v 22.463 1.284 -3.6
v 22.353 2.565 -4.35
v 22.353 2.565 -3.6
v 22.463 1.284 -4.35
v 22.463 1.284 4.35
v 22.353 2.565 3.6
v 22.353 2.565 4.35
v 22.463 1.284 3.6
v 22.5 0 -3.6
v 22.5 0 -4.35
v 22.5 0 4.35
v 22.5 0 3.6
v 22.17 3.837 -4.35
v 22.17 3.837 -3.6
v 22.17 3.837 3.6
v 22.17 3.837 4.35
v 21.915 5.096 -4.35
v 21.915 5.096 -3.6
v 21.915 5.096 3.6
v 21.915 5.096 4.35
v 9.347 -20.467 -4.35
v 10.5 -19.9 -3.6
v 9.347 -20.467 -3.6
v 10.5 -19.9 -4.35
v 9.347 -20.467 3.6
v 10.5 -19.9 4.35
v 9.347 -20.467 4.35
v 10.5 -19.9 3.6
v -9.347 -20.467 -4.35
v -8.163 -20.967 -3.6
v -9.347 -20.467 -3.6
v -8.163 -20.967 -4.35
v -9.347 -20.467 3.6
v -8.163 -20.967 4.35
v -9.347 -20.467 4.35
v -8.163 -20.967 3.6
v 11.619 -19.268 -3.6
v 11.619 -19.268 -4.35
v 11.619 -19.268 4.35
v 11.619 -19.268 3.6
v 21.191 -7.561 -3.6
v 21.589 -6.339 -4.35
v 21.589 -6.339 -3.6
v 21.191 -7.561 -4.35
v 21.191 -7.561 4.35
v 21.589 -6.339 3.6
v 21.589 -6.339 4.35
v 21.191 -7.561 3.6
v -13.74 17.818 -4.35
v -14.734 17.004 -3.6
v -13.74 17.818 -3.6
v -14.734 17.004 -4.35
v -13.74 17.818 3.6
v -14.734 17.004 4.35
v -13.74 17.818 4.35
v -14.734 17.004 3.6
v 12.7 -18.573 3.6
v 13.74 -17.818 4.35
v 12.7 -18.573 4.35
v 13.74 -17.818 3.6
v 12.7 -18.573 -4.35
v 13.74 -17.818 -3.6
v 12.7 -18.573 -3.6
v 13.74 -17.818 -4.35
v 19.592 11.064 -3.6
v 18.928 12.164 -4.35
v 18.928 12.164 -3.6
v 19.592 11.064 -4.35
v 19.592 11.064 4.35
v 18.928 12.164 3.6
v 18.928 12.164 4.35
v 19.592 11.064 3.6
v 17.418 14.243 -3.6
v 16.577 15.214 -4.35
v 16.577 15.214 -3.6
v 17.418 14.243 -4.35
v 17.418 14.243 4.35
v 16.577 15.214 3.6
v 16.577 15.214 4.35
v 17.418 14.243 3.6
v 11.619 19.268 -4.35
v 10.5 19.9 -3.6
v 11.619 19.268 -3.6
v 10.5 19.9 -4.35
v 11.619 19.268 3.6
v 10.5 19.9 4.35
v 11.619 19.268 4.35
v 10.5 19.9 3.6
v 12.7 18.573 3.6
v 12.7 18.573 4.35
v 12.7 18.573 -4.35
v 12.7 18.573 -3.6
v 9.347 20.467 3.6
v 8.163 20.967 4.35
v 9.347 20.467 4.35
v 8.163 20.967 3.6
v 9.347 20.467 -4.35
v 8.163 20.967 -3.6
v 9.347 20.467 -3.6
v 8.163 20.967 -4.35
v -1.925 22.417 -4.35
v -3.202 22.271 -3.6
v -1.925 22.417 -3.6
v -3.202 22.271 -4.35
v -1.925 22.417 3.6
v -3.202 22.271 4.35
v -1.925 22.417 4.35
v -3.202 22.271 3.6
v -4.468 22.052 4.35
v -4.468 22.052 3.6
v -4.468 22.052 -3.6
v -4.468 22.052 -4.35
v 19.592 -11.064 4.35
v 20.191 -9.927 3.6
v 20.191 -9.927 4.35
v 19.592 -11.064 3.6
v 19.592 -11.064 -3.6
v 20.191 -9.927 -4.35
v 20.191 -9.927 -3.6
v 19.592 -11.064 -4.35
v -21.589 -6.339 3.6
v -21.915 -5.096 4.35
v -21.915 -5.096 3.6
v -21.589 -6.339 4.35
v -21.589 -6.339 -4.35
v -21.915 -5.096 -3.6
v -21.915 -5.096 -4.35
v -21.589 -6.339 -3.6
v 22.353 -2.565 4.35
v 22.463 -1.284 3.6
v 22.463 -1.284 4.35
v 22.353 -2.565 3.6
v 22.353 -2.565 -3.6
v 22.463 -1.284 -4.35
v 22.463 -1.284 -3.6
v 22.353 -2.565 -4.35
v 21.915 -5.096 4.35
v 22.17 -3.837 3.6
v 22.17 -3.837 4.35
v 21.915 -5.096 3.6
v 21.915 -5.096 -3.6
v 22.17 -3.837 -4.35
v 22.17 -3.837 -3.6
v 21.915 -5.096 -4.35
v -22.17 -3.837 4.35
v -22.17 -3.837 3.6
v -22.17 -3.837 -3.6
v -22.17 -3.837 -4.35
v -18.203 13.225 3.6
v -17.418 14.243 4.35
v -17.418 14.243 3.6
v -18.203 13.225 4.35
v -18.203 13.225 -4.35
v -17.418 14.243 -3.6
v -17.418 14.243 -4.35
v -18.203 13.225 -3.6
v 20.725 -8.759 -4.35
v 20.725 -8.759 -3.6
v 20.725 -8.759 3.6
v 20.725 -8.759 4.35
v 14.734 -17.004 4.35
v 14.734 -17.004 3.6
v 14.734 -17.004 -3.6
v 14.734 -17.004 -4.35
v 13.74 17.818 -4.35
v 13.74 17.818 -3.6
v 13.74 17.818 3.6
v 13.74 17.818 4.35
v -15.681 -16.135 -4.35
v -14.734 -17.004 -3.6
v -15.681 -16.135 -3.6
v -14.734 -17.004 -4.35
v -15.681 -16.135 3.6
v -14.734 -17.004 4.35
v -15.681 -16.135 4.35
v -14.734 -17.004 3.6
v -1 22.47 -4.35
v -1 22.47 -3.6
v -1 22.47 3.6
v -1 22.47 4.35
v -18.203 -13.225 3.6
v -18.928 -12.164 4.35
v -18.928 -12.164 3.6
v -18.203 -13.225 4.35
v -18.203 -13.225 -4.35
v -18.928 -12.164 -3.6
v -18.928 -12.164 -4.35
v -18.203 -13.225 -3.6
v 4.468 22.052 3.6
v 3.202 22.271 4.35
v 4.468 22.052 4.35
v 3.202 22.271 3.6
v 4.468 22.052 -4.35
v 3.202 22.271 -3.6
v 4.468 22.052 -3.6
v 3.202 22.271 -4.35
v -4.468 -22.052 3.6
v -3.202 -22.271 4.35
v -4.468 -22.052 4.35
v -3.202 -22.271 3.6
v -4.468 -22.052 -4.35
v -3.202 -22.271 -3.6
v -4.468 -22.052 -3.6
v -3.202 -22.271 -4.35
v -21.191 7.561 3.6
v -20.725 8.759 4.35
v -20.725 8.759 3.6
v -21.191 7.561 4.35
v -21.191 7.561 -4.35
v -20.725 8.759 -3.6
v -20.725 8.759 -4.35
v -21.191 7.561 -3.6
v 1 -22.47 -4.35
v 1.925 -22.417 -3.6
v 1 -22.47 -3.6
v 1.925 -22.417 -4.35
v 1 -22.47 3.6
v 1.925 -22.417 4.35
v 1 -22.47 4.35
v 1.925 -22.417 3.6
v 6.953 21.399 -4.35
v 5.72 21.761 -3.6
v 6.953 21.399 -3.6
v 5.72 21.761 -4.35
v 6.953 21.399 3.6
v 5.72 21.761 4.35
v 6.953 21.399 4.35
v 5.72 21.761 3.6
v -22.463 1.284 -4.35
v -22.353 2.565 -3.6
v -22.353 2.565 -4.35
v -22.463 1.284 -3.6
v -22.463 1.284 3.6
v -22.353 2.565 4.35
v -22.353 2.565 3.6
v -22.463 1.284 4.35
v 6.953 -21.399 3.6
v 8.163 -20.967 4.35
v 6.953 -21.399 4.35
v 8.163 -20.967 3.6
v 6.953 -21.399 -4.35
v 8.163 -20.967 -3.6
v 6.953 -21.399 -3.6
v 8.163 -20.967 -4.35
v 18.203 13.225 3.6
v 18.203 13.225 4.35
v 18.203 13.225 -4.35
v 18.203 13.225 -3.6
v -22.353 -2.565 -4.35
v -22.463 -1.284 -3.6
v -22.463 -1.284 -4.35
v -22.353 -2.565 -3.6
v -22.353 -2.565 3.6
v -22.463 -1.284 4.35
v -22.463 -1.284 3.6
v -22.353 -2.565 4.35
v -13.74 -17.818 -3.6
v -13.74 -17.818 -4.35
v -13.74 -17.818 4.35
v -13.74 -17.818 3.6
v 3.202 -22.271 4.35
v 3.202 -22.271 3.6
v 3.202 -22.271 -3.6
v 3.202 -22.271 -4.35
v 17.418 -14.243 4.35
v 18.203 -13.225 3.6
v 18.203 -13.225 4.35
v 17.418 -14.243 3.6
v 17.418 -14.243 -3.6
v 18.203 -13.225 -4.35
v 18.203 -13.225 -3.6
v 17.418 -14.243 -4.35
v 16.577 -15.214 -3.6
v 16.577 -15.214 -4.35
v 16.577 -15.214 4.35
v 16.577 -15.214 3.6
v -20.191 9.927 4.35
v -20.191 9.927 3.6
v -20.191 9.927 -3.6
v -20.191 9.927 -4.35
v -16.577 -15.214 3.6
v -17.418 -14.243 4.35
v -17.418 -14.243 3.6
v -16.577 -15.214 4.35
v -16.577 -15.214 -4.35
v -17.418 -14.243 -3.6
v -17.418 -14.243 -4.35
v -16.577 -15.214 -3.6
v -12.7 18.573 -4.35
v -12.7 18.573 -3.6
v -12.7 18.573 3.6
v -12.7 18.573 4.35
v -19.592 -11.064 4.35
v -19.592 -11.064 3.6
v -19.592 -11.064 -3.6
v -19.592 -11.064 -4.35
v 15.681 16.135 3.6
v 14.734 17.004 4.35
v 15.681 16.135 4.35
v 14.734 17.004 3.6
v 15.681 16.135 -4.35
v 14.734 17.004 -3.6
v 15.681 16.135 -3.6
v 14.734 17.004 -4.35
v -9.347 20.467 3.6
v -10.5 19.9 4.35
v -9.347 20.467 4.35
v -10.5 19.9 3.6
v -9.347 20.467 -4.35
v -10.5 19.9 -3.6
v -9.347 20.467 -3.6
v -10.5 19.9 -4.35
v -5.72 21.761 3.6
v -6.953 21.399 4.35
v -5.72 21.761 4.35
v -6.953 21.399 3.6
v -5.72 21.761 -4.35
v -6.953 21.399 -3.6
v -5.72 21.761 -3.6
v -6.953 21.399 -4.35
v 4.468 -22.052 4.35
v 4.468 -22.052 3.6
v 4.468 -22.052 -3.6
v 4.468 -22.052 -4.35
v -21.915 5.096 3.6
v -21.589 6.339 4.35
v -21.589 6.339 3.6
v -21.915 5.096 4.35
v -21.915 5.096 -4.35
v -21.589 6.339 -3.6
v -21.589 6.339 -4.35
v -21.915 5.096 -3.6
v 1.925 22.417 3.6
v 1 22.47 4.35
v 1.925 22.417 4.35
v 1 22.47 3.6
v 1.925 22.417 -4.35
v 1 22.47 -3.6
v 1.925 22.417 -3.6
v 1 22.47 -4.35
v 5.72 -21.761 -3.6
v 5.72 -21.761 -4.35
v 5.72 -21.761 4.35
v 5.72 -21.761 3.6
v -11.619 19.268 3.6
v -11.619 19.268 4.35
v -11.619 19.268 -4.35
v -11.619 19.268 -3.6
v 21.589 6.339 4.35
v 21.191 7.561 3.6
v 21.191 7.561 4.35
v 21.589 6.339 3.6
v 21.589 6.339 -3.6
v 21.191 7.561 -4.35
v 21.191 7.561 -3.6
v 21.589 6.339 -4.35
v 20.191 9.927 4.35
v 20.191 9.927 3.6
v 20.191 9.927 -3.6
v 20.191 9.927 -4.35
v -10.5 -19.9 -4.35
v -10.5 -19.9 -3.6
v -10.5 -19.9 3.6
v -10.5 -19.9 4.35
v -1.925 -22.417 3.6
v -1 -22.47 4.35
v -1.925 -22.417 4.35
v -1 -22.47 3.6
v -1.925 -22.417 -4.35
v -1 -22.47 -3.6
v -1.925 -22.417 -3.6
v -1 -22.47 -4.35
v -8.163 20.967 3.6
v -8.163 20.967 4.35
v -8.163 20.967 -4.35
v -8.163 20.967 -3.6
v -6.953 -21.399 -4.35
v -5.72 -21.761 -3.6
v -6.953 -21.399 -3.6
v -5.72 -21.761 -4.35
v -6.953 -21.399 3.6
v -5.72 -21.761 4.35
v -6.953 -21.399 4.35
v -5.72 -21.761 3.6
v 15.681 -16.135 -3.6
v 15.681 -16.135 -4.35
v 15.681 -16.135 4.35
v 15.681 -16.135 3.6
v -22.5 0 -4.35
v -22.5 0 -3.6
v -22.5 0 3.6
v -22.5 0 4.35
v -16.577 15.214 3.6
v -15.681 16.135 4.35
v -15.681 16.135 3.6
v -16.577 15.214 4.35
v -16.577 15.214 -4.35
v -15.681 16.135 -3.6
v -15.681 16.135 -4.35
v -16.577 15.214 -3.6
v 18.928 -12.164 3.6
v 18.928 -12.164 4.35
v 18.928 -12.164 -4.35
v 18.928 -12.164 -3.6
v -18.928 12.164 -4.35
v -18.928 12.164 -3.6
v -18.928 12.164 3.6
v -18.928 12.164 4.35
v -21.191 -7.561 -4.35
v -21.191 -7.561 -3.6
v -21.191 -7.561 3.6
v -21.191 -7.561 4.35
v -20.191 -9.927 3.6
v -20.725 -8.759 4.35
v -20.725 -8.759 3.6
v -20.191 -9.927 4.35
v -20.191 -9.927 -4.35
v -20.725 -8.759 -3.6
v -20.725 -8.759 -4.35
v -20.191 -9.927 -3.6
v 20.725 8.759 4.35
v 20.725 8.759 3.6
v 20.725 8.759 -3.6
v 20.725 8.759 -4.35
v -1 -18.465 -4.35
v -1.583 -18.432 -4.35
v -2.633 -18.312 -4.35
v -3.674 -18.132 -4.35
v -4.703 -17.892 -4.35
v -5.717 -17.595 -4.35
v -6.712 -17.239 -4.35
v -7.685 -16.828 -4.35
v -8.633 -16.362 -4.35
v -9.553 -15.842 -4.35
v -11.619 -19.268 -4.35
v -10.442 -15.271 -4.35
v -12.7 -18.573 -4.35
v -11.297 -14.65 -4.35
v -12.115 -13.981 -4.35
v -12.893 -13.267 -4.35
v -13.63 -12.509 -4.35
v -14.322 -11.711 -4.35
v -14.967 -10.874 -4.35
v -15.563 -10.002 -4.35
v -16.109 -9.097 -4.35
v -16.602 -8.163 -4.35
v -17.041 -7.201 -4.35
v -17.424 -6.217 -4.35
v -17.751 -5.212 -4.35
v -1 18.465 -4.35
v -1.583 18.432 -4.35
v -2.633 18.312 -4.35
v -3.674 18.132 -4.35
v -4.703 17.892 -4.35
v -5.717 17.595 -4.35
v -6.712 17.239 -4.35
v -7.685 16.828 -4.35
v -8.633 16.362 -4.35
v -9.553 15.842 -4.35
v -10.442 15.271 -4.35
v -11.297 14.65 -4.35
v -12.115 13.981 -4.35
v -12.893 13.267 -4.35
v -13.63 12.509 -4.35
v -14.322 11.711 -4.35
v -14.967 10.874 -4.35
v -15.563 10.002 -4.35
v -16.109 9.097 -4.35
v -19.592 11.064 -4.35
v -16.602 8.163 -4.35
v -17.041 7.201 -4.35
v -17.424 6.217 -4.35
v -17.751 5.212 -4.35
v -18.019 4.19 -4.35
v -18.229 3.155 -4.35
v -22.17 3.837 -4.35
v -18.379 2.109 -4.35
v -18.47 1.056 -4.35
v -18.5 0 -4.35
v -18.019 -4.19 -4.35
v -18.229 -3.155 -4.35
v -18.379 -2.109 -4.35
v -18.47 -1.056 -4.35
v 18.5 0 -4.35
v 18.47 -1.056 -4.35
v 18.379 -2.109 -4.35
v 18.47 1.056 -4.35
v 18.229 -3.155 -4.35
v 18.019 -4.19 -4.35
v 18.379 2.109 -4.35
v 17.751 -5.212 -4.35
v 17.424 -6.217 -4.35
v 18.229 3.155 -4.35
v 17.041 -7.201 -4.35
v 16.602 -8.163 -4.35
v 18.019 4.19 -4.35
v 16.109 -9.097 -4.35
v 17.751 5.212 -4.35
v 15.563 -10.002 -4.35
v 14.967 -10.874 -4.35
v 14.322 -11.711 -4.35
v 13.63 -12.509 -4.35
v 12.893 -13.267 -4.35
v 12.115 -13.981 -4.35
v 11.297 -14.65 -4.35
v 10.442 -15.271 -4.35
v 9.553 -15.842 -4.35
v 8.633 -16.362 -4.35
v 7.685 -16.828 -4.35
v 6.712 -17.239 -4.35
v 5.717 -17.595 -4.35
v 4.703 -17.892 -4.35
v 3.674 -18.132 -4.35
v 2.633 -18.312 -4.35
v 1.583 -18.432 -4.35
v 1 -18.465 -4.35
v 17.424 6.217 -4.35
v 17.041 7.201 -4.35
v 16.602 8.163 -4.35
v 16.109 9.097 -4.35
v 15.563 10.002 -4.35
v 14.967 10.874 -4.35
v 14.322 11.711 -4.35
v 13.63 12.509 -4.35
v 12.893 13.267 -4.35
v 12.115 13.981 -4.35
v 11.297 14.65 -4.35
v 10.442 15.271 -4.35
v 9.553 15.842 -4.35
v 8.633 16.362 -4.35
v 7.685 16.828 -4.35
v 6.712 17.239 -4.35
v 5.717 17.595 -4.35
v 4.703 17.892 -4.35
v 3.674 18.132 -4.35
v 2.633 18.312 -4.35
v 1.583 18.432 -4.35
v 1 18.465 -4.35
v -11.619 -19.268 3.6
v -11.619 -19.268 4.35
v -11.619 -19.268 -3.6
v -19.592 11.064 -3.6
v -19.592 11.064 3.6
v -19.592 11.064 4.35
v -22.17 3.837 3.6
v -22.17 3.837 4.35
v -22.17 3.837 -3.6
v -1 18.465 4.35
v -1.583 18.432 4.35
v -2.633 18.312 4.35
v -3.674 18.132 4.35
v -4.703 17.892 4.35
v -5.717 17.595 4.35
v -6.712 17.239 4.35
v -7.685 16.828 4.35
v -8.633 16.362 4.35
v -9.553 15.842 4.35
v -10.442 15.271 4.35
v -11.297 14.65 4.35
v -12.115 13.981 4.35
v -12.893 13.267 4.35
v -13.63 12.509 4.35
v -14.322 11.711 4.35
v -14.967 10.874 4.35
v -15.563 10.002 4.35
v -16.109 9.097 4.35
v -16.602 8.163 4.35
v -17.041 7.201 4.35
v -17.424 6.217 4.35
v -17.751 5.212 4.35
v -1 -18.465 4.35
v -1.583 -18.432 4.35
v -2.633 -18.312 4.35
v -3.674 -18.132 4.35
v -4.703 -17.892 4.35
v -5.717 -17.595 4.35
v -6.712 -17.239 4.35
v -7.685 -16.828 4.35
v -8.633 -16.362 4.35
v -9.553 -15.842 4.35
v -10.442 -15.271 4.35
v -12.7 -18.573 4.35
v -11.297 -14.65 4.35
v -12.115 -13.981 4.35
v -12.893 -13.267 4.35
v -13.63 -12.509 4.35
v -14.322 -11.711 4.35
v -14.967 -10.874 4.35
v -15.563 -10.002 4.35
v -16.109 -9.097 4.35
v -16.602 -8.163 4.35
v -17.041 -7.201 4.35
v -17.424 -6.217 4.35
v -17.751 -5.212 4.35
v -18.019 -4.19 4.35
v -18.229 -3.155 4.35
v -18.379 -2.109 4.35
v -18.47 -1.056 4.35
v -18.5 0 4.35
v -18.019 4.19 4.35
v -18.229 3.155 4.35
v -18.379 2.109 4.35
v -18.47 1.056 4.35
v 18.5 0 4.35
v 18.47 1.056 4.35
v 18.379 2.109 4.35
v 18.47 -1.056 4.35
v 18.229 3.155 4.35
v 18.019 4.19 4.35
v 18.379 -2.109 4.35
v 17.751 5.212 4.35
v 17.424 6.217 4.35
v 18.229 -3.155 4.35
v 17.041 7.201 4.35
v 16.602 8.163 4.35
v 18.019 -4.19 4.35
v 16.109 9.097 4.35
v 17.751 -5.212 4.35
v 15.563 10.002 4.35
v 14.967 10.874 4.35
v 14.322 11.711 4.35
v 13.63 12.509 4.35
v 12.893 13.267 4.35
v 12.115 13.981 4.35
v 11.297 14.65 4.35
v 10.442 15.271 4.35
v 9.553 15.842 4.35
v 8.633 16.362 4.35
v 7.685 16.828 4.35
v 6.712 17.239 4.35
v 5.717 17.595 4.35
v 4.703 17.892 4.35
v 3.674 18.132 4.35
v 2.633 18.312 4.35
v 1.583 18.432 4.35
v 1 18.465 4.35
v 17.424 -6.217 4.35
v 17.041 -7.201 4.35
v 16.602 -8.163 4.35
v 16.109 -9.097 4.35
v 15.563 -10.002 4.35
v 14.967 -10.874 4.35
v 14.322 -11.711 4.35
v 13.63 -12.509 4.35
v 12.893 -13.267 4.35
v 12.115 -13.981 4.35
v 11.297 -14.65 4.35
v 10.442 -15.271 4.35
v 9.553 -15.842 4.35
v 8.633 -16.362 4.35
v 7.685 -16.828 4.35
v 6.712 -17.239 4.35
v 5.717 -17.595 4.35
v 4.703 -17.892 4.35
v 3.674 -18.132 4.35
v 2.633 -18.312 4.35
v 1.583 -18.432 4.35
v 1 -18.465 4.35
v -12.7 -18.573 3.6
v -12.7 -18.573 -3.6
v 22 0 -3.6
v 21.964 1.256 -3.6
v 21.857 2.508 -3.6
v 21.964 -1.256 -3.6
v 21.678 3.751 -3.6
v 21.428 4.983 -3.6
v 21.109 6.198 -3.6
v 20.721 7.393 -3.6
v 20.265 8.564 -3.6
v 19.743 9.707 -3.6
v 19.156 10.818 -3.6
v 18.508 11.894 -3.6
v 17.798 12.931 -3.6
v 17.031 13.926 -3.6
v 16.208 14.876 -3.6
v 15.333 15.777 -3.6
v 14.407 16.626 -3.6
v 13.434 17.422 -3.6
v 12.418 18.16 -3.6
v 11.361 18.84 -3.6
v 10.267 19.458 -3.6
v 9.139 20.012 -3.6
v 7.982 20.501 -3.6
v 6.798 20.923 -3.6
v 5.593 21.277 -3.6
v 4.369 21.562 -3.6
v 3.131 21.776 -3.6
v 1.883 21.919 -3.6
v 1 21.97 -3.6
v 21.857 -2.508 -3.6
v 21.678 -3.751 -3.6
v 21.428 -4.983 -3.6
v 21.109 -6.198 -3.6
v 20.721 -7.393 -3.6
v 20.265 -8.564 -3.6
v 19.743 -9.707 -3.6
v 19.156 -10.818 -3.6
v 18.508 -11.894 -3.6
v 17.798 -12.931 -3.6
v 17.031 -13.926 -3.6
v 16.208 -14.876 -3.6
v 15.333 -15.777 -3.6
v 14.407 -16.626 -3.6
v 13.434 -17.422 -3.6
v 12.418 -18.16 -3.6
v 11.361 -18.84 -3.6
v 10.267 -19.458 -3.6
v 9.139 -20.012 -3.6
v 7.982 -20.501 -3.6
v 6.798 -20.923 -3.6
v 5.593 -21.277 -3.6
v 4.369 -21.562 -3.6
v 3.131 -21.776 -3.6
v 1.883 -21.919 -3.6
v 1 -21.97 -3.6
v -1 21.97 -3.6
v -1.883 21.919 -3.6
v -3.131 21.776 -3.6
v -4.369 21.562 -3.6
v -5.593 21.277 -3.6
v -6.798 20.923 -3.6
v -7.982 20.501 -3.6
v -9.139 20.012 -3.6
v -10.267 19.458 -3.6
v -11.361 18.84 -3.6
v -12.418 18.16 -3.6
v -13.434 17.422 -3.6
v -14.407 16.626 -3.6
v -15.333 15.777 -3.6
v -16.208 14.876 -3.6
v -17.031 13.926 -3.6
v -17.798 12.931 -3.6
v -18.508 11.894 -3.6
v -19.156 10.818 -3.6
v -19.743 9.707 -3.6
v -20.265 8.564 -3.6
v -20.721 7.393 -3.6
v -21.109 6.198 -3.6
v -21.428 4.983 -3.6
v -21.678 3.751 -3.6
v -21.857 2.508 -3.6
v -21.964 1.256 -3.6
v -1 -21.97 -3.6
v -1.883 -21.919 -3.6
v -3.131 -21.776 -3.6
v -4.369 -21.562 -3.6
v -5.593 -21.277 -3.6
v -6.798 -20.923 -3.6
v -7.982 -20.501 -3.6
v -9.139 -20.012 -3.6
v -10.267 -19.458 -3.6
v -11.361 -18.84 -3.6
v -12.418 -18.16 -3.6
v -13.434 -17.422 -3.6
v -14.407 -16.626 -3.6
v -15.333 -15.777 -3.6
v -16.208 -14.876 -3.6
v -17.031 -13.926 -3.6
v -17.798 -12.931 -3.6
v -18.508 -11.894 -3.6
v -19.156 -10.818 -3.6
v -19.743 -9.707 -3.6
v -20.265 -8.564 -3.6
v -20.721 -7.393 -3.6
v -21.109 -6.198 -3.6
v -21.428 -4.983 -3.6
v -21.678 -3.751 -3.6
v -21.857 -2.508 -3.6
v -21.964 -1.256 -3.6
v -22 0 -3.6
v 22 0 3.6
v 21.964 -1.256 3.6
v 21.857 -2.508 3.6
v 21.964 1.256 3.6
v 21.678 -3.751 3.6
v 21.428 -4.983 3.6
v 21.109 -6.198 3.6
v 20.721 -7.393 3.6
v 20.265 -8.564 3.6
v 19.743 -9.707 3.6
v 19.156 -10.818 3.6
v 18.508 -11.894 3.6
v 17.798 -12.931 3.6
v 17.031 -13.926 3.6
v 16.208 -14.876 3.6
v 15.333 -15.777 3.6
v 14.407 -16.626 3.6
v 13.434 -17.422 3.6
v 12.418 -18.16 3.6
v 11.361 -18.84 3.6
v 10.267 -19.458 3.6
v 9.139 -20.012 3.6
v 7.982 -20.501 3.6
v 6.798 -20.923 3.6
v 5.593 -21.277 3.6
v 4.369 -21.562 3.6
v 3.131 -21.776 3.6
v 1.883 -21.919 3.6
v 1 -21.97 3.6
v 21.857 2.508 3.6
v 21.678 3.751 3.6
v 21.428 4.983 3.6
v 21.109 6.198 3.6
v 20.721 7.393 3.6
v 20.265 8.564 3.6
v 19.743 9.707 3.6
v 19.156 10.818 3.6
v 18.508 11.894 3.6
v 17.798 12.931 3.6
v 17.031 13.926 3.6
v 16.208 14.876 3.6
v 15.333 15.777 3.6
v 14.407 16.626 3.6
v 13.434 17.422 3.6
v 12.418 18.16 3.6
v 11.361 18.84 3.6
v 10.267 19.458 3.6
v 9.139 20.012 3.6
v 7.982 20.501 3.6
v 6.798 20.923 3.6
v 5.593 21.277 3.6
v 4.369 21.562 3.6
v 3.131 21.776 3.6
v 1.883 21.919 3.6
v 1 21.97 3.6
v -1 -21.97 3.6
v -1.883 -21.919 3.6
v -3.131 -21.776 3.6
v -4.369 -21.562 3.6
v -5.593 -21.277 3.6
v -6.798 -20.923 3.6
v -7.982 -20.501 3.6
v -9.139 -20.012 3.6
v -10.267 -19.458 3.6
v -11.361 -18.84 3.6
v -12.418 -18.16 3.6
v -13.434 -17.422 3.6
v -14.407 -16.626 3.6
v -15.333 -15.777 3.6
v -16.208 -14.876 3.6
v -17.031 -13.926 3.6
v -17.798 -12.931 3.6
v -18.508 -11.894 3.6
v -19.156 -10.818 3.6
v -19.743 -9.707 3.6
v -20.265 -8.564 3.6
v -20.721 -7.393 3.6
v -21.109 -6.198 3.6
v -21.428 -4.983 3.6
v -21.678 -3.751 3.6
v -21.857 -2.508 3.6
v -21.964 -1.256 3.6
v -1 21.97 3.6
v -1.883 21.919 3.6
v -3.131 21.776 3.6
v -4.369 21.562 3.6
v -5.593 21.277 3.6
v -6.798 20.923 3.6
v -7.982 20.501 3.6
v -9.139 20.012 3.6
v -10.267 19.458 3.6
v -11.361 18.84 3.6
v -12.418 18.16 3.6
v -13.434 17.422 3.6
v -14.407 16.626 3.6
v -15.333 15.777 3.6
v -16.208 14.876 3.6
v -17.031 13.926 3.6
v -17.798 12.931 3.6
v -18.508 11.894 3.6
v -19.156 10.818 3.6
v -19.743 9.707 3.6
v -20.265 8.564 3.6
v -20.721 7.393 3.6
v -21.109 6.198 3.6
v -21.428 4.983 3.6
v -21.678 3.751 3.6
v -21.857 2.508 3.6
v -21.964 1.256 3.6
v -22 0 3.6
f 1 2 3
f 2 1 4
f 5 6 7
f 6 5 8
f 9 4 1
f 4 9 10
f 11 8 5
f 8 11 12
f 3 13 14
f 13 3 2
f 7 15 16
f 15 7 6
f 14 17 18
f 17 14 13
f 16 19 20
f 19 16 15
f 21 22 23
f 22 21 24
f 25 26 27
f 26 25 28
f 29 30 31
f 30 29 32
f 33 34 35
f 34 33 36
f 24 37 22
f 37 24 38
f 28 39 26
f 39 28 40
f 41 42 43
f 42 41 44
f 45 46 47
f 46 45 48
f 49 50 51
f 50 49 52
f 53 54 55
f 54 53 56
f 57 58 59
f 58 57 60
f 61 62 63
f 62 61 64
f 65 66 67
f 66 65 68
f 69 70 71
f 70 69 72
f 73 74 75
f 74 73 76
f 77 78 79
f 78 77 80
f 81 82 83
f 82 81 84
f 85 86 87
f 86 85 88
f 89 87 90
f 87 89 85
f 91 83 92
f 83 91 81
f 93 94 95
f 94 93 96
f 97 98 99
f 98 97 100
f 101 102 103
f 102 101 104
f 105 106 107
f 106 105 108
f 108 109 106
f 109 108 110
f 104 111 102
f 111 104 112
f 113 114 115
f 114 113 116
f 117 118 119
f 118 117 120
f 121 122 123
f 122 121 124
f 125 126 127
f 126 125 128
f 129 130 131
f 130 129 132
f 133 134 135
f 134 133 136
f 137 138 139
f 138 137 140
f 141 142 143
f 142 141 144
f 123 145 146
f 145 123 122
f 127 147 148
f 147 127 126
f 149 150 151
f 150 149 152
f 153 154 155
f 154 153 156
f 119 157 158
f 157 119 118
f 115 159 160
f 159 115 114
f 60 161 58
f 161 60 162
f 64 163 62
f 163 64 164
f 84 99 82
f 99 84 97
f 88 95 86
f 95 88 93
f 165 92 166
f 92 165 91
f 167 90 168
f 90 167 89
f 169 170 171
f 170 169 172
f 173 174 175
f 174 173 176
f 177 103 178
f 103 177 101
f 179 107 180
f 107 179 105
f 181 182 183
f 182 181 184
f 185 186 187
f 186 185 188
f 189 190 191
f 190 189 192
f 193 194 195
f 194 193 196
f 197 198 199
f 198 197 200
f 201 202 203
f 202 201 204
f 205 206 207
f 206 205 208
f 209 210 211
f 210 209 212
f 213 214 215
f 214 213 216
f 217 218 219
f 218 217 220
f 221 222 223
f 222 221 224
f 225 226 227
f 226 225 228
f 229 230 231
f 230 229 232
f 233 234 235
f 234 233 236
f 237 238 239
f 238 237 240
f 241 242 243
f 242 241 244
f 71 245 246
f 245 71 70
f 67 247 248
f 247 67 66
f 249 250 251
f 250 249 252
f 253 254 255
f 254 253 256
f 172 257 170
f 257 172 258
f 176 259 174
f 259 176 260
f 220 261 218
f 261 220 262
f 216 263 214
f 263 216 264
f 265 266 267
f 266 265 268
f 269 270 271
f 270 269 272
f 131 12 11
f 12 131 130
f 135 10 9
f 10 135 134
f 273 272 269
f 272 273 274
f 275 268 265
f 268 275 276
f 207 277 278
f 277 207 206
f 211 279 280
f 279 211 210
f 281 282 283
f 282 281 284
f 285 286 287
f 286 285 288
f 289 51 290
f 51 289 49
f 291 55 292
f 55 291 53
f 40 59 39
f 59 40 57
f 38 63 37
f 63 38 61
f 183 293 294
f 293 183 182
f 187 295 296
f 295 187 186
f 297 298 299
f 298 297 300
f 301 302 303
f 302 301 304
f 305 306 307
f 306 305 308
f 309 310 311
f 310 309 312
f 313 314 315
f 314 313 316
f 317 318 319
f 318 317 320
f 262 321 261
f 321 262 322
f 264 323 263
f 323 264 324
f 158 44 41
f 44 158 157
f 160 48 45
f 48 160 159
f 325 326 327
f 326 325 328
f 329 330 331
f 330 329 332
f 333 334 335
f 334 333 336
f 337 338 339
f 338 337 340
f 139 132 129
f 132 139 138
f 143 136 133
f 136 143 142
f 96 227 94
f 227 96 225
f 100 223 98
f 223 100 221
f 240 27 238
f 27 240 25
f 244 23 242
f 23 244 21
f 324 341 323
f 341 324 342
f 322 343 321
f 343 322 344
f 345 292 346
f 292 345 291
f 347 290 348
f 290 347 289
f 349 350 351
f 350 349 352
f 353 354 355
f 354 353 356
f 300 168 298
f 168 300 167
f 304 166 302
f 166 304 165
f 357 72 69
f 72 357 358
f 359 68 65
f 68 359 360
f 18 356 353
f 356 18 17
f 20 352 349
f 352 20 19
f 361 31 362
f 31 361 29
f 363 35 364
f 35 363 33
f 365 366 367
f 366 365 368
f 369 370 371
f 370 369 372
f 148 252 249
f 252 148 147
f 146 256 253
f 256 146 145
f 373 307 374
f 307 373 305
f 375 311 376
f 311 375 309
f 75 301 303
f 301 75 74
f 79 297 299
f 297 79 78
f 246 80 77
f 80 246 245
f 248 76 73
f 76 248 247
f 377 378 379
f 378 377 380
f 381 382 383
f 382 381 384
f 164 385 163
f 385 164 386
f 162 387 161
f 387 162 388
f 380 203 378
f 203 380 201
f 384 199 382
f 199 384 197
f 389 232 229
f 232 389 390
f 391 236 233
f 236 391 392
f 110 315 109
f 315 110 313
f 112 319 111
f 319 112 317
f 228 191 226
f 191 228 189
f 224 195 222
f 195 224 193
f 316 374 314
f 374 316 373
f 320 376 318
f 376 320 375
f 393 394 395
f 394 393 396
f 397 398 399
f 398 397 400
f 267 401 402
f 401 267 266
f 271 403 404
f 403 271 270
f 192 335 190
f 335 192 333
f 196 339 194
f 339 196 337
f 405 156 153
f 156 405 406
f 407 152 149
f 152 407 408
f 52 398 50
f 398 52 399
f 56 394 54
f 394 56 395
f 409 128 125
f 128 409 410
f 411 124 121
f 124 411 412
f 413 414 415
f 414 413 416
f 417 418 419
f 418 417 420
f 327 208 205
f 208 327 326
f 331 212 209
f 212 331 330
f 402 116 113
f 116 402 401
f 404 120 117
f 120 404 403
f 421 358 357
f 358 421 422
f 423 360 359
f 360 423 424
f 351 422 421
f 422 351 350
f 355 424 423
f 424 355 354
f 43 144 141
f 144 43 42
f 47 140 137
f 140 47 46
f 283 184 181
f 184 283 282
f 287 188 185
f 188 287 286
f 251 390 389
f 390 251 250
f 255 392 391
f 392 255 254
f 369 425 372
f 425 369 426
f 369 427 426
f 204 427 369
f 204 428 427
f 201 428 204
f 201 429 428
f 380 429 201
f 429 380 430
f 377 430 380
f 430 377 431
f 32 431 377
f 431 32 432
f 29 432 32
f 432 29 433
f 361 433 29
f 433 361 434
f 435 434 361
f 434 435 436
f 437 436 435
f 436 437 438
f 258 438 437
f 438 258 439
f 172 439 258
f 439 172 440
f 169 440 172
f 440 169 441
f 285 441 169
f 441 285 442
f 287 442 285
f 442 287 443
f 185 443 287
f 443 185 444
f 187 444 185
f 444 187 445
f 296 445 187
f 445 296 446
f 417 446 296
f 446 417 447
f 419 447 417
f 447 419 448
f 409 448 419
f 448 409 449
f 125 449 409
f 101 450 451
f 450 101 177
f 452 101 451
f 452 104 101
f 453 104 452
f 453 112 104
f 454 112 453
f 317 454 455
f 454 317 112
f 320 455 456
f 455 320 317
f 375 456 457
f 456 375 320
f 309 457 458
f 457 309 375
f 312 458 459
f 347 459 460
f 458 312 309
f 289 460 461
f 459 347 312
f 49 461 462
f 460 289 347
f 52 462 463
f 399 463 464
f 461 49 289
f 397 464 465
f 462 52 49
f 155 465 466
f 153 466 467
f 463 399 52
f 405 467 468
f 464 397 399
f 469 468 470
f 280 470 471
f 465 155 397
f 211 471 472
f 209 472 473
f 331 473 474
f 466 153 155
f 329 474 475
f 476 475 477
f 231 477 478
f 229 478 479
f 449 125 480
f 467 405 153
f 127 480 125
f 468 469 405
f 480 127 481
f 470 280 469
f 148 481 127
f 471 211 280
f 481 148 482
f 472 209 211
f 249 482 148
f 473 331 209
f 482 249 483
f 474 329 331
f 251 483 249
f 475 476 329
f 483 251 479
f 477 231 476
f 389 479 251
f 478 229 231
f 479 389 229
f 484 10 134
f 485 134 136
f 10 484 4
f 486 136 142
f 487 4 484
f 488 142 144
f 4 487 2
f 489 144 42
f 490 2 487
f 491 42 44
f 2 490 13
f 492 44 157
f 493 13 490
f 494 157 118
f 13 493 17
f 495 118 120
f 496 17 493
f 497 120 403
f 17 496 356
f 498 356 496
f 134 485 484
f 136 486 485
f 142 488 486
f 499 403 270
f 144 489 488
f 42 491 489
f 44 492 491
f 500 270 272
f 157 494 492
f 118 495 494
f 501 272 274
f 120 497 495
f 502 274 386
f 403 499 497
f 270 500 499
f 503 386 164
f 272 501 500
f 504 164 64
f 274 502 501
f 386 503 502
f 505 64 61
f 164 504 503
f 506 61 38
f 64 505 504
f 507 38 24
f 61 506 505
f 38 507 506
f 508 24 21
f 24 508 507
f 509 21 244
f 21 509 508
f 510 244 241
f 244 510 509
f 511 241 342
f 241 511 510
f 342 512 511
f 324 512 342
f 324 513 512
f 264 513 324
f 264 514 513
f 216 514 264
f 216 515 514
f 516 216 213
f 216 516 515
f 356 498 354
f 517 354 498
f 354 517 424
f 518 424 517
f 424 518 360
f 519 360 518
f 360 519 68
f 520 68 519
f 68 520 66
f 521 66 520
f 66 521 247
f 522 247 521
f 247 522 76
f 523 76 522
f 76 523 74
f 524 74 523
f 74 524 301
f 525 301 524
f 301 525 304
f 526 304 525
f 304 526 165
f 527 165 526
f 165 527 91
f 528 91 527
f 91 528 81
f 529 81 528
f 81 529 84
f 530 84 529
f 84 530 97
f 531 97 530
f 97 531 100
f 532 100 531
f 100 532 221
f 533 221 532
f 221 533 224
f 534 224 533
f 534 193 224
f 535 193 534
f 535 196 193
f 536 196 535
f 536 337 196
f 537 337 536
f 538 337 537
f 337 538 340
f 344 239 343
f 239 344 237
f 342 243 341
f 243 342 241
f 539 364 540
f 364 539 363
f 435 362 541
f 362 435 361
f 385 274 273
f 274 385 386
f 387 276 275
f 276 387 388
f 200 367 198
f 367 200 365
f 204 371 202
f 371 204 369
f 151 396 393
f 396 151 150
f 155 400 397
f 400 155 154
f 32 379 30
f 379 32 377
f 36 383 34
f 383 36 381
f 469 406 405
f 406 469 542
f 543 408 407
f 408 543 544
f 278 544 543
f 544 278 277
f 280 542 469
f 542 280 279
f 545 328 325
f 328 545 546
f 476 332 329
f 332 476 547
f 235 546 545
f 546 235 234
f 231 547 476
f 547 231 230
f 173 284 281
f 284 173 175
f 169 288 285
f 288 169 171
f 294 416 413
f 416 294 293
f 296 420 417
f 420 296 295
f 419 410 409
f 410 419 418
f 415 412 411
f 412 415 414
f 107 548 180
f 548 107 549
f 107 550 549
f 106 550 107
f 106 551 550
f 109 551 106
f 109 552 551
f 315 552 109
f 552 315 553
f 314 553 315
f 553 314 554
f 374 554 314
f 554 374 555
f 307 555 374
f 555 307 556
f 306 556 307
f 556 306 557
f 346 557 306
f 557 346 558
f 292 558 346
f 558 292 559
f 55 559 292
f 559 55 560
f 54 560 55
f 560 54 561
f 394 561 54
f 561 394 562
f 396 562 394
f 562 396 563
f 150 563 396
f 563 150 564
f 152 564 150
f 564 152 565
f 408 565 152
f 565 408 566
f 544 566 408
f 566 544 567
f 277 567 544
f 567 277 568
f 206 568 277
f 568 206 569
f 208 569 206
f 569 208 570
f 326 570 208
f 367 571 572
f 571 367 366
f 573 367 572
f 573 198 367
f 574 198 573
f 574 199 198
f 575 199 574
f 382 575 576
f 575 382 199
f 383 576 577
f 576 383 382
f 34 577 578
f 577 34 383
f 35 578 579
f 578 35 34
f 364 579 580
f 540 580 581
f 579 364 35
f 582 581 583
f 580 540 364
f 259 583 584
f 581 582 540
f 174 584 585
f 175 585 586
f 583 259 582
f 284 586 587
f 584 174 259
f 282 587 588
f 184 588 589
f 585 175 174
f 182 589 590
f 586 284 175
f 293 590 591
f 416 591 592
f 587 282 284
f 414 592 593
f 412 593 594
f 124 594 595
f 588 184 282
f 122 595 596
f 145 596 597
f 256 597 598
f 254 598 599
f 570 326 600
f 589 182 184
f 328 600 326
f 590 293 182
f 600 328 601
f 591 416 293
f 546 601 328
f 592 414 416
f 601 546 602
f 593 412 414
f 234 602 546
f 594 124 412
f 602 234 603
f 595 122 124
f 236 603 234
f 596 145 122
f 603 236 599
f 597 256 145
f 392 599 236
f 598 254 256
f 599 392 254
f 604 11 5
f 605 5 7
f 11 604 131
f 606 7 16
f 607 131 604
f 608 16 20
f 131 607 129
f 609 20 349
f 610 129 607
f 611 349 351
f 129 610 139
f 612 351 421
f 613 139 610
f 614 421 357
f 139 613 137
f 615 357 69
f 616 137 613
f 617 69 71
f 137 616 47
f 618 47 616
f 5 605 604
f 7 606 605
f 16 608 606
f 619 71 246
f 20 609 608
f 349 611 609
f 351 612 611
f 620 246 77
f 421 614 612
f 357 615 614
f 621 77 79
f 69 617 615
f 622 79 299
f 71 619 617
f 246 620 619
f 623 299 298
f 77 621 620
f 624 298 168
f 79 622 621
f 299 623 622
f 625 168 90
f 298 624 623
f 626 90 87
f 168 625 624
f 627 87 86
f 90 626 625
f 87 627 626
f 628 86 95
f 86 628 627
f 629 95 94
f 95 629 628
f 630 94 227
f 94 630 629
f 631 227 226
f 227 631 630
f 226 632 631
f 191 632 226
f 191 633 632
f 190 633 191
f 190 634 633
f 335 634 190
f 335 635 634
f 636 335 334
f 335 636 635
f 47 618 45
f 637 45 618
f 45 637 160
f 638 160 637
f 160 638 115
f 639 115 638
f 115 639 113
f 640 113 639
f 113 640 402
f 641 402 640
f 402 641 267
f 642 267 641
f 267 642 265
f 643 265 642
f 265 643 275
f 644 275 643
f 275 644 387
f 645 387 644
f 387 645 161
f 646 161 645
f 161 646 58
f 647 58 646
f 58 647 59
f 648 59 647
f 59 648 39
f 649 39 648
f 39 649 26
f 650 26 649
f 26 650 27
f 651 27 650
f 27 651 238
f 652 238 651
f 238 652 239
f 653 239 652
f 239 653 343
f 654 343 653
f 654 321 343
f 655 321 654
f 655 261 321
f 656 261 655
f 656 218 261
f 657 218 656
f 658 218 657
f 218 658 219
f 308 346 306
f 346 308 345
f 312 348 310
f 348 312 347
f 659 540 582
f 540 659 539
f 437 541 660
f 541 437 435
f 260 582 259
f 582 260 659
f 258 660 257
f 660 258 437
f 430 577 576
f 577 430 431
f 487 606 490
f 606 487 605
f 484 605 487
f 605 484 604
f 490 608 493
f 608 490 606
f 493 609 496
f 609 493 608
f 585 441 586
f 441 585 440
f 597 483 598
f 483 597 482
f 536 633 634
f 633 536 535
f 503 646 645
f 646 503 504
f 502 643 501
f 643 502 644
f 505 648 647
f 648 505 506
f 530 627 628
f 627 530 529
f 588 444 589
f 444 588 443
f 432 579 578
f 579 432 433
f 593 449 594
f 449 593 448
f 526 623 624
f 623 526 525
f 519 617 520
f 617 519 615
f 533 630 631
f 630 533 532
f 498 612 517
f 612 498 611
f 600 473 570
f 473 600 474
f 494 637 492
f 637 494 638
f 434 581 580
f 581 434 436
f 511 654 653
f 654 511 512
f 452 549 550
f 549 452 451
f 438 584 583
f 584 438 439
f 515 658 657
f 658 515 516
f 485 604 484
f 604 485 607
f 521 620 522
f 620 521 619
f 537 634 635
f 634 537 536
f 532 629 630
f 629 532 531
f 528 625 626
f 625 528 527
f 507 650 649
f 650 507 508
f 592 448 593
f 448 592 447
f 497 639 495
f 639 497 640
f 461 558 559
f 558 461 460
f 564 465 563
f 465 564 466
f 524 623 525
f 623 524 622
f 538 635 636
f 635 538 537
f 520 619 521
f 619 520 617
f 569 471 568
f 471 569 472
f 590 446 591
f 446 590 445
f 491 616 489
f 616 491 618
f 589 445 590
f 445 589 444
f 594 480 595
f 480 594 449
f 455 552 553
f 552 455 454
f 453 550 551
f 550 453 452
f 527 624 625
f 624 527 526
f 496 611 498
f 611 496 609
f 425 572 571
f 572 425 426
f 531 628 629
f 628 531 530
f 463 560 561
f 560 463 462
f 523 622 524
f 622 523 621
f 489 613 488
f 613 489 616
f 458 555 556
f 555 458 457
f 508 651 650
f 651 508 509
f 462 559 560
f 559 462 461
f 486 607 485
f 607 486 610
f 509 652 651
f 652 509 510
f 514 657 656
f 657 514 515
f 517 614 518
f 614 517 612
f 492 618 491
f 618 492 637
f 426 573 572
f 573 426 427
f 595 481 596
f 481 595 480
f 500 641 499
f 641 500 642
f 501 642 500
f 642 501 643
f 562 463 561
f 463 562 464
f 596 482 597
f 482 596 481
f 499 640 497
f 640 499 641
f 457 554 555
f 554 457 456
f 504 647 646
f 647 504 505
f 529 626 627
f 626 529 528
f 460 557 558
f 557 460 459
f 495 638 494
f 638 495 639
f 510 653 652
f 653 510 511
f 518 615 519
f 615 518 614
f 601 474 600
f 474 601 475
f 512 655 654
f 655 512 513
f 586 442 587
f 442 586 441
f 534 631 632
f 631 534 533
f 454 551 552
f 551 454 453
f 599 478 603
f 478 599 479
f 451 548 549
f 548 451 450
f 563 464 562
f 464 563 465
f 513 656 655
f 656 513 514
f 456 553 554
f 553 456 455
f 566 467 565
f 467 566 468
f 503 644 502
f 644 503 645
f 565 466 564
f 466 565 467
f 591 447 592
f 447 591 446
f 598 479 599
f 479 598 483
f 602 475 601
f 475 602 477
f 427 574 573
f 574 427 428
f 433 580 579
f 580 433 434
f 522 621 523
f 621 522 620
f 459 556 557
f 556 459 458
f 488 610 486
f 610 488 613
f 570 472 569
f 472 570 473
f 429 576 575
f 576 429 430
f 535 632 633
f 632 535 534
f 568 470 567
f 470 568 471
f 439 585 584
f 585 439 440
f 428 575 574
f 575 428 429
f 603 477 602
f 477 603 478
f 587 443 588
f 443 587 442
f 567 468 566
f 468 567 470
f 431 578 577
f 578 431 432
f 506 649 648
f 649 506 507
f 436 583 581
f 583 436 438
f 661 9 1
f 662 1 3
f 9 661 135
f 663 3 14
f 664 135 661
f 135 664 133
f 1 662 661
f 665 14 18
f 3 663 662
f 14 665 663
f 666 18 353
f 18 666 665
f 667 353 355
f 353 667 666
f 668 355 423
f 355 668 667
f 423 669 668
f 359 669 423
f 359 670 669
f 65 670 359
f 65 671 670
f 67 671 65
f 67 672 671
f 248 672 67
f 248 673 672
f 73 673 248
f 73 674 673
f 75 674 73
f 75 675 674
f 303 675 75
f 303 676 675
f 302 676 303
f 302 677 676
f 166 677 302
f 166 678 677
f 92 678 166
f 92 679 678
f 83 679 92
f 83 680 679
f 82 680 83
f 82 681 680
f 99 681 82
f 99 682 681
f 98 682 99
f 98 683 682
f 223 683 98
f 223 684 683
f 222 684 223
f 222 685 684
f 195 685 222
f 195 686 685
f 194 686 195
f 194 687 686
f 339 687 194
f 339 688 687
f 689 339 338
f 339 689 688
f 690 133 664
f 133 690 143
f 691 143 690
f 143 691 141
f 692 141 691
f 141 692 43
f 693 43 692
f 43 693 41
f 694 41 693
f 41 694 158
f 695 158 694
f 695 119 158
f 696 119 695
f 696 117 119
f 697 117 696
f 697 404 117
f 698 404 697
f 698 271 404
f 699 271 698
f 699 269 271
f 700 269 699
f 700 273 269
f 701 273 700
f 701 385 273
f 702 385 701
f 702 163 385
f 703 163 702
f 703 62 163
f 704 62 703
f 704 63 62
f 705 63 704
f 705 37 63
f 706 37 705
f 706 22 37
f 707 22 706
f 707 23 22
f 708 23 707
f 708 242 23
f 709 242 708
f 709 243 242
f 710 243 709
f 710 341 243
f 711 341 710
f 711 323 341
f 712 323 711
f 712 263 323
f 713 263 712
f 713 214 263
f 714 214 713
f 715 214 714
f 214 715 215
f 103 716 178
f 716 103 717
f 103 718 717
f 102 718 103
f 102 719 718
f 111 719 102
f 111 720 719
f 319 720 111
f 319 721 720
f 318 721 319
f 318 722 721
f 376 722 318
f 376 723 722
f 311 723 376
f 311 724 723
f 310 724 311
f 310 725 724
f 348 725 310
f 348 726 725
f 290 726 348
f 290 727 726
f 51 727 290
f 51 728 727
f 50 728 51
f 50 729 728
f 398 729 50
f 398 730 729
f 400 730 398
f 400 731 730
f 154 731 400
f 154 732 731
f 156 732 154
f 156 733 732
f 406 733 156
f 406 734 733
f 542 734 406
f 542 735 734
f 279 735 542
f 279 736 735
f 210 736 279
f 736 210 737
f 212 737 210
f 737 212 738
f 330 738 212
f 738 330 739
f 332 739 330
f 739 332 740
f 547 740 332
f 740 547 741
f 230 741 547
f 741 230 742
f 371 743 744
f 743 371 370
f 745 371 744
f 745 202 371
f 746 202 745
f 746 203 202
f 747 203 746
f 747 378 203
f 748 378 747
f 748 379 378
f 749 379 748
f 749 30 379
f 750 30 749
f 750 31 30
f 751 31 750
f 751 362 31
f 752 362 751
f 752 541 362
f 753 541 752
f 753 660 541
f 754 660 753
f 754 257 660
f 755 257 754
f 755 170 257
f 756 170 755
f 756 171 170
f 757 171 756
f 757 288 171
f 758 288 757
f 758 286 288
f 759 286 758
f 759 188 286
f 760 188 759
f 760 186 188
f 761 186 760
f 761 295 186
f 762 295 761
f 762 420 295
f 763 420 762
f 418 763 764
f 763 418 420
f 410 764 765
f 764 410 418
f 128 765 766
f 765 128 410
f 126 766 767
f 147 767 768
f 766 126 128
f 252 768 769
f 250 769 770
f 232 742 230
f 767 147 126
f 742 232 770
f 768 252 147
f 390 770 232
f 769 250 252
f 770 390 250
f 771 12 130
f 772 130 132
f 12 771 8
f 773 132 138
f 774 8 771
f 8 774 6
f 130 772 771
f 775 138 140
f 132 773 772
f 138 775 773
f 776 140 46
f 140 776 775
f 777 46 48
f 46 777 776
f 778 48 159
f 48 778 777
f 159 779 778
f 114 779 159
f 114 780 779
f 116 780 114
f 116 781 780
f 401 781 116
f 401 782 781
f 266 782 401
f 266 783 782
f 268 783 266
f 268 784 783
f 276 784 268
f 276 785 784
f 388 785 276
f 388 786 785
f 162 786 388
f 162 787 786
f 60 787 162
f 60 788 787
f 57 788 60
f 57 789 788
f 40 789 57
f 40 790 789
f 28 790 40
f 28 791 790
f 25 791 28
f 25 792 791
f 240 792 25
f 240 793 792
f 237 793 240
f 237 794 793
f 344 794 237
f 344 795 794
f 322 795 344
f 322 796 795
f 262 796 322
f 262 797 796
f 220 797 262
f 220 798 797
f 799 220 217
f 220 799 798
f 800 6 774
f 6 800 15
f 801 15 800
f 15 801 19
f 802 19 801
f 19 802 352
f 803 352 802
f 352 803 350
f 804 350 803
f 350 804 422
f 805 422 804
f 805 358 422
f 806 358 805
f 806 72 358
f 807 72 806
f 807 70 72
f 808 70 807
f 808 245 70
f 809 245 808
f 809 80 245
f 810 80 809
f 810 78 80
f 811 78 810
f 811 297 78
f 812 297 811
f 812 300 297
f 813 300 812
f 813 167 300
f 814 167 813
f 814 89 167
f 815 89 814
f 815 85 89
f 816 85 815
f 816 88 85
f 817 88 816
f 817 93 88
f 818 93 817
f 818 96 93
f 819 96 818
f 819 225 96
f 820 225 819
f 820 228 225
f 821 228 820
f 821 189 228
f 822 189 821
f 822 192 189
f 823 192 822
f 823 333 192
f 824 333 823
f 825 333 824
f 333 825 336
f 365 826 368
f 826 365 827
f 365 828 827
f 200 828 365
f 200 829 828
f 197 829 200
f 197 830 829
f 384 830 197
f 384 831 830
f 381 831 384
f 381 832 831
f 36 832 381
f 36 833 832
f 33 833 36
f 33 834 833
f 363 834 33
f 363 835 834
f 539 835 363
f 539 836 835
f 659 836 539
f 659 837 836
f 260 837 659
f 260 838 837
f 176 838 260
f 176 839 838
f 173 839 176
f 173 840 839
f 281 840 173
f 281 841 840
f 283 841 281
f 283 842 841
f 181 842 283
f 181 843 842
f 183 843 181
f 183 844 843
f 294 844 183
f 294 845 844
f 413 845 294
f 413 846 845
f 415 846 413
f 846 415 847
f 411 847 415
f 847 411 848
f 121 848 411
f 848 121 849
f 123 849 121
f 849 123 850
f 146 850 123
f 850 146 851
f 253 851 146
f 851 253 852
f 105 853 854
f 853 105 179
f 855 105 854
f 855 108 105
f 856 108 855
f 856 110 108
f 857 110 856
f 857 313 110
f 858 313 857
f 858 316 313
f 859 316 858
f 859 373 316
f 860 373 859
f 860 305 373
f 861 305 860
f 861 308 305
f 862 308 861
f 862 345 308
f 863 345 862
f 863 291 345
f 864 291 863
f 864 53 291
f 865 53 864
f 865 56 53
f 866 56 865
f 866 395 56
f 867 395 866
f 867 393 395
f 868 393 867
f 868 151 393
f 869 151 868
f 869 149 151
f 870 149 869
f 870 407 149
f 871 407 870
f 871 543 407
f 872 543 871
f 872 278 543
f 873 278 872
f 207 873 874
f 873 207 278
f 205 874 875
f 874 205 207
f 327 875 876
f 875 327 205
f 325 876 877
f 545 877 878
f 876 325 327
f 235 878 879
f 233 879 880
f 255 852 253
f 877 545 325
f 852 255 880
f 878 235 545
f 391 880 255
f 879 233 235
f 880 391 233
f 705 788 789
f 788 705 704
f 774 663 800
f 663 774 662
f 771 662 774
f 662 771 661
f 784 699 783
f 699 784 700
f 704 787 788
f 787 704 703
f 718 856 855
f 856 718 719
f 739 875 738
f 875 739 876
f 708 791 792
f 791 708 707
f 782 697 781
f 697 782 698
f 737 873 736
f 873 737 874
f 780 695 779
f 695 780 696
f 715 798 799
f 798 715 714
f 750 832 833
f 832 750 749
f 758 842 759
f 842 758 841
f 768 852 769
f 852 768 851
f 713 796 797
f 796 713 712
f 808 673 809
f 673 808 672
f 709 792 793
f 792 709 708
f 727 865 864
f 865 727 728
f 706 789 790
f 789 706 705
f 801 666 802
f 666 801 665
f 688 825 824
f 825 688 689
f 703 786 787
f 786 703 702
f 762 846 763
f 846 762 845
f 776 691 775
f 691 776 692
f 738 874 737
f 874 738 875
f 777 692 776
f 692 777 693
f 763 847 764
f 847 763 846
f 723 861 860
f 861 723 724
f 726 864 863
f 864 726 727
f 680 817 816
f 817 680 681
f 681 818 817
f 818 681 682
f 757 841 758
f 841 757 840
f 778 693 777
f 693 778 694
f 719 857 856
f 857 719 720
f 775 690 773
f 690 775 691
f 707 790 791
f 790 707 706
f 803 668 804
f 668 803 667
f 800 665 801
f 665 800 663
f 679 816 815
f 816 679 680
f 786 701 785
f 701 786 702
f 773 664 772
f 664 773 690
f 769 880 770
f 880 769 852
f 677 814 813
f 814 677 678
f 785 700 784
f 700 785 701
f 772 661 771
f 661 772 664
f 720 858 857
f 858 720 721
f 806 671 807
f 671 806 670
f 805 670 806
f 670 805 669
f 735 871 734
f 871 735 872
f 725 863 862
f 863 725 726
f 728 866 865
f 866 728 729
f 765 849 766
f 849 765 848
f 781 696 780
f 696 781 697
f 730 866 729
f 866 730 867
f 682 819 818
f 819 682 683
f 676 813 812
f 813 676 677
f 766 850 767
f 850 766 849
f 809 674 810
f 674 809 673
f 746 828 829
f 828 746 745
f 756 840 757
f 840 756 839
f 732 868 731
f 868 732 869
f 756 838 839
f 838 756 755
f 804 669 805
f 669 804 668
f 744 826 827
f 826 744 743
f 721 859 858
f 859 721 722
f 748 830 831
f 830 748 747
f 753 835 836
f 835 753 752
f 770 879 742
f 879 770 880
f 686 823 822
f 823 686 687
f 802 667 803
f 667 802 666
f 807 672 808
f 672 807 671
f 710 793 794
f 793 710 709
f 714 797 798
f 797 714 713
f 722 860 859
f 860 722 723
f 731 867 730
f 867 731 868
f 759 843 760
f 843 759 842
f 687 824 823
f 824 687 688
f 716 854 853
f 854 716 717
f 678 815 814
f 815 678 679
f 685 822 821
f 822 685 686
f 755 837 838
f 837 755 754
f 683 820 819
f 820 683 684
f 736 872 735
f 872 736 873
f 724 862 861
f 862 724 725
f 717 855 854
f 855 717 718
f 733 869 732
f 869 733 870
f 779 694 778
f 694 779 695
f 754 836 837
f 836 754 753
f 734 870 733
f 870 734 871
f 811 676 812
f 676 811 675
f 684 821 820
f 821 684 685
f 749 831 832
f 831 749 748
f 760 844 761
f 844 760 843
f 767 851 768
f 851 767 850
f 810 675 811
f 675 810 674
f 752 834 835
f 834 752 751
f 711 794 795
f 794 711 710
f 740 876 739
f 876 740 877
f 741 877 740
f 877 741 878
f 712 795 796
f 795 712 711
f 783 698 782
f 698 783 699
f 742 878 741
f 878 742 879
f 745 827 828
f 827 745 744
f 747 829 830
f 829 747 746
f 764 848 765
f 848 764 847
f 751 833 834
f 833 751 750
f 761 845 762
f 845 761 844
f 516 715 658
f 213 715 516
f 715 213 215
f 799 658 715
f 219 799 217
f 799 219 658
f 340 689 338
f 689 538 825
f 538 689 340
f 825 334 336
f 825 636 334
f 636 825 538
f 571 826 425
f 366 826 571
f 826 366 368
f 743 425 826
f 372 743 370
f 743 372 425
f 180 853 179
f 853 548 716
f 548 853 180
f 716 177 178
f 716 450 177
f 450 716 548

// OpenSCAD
$fn=110;

module mezikruzi(h_in, d1_in, d2_in){
    difference(){
        cylinder(h=h_in, d=d2_in, center=true);
        cylinder(h=h_in, d=d1_in, center=true);
        }//diff
    }//module
    
    
difference(){
    mezikruzi(8.7,37,45);
    union(){
        color("Red") mezikruzi(7.2,44,45);
        
        color("Red") cube([2,48,10],center=true);
    }//union
}//diff
